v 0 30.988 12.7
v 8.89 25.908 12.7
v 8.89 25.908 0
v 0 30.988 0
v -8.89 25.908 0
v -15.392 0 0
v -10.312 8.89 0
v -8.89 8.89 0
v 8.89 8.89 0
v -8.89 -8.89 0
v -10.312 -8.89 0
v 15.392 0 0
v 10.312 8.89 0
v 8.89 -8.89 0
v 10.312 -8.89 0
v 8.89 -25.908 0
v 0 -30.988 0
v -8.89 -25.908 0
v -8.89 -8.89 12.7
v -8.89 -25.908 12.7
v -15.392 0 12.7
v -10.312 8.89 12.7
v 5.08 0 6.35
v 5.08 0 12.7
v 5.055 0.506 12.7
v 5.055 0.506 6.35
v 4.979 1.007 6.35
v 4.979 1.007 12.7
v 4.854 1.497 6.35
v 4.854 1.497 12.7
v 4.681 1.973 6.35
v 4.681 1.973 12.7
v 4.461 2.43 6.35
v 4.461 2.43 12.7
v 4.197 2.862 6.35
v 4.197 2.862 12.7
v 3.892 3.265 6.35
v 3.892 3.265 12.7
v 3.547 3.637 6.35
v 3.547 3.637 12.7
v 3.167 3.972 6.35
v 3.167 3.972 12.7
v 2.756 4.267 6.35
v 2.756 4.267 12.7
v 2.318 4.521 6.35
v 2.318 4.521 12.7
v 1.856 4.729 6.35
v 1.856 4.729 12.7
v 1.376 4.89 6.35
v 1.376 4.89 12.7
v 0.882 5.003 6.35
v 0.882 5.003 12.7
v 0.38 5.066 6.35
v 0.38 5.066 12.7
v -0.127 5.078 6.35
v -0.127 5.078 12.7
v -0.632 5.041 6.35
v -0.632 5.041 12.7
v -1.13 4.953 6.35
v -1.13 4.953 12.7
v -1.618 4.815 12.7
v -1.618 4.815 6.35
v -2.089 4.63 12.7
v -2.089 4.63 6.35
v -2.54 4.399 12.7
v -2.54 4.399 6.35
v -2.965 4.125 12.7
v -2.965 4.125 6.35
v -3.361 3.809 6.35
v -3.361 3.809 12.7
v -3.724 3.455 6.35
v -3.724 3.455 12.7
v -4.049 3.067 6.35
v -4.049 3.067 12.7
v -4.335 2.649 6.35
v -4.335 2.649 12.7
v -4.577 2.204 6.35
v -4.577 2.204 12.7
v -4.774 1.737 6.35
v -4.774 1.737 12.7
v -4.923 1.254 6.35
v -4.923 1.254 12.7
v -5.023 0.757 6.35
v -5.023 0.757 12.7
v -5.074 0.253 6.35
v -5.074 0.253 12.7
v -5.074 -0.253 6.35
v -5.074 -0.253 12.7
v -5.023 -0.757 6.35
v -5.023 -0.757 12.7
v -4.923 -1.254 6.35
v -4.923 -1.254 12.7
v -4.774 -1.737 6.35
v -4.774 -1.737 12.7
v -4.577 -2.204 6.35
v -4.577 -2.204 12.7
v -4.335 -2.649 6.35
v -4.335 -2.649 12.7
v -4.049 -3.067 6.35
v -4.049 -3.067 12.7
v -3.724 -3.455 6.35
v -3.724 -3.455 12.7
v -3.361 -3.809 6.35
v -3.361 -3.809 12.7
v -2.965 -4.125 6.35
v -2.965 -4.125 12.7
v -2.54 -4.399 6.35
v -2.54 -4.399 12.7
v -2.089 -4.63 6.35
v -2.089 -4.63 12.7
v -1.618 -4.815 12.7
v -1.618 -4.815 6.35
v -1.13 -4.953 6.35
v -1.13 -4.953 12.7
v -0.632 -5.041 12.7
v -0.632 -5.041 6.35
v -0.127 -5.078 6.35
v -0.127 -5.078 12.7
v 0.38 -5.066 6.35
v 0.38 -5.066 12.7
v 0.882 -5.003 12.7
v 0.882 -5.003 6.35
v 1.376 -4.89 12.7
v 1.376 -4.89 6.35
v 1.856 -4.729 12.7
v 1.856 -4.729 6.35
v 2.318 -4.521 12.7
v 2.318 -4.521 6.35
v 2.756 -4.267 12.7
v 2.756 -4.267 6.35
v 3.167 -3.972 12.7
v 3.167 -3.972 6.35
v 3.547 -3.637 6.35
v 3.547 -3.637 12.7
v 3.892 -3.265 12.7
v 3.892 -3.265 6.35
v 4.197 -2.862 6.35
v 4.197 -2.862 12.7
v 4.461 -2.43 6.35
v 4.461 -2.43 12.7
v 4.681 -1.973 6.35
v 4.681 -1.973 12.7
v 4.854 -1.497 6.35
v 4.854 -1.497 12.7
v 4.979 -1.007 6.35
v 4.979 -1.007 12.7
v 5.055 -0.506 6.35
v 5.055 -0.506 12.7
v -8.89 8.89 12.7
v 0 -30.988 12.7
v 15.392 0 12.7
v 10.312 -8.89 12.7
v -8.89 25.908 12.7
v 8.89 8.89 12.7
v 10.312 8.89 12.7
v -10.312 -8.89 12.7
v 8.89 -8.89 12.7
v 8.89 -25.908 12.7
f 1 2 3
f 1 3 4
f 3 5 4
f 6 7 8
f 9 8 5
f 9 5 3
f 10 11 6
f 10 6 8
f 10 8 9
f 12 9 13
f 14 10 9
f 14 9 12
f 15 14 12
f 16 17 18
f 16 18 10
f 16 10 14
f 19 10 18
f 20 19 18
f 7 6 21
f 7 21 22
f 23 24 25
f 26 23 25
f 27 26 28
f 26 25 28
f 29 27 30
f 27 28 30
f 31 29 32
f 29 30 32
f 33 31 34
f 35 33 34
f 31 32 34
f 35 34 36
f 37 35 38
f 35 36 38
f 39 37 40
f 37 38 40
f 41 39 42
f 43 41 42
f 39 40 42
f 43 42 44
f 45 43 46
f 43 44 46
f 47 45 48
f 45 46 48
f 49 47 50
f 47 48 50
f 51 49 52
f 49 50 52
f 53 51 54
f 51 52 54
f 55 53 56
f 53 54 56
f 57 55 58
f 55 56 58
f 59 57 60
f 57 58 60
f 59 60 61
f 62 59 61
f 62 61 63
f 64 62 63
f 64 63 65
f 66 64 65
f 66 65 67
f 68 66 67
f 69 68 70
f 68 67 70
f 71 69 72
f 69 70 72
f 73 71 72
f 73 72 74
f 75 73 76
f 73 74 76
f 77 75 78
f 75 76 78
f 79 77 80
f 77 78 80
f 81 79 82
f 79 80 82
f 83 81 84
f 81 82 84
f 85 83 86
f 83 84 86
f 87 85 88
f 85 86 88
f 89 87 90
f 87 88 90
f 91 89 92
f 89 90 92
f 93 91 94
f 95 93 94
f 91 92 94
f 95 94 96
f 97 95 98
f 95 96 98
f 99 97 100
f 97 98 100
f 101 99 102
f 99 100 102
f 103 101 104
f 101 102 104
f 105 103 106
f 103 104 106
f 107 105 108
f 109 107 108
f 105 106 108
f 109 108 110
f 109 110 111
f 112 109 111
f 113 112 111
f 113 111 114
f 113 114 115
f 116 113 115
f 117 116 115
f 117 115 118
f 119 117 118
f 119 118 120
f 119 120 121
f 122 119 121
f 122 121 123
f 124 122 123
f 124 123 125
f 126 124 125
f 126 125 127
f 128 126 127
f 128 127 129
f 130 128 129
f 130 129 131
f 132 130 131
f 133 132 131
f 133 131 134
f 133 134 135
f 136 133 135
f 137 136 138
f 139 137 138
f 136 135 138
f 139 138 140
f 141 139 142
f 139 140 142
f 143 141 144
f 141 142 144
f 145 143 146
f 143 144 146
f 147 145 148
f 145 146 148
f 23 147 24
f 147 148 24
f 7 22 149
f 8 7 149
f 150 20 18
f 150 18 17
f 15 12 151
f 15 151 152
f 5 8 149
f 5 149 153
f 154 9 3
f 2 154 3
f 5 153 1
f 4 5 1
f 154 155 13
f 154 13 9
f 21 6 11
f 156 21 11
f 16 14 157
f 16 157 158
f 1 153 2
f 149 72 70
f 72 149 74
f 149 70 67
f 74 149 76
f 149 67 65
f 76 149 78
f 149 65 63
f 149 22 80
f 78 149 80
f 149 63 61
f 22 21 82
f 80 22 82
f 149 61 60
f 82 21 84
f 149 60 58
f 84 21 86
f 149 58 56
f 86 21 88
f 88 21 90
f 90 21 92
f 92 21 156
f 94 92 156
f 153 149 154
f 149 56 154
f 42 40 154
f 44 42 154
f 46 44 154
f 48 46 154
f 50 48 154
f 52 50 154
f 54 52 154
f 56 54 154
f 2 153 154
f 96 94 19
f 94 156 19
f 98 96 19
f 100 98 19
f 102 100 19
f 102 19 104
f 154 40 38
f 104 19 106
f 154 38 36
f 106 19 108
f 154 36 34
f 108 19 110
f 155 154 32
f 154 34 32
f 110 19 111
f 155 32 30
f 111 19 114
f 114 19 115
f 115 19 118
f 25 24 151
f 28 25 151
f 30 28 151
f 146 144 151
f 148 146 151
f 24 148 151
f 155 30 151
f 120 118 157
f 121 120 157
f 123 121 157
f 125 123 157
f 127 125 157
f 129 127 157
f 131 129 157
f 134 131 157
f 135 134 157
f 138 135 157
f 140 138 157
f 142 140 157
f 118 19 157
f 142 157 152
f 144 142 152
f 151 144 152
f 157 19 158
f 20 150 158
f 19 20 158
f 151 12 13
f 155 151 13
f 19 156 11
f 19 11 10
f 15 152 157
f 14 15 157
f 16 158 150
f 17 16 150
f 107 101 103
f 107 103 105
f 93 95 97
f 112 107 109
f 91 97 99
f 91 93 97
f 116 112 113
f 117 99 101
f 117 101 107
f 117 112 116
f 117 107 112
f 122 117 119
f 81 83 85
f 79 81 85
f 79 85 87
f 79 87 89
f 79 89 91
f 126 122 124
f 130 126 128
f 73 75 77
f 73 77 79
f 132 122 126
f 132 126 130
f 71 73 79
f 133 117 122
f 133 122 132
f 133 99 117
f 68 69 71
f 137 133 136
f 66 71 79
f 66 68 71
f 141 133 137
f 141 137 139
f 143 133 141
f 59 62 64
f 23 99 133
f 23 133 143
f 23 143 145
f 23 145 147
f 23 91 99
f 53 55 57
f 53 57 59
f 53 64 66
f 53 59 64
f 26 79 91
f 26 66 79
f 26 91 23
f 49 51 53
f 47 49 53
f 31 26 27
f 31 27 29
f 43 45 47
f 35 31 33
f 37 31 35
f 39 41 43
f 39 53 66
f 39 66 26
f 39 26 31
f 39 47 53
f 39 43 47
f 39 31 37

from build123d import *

# Parameters (mm, degrees)
BOSS_EXTRUDE1_DEPTH  = 12.7
MIRROR2_COPY_1_DEPTH = 12.7
SKETCH2_R            = 5.08
CUT_EXTRUDE1_DEPTH   = 6.35


with BuildPart() as part:
    # Sketch1 → Boss-Extrude1 (new body)
    with BuildSketch(Plane.XY):
        Polygon((0, 0), (-15.3924, 0), (-10.3124, 8.89), (-8.89, 8.89), (-8.89, 25.908), (0, 30.988), align=None)
    boss_extrude1 = extrude(amount=BOSS_EXTRUDE1_DEPTH)

    # Mirror1: Boss-Extrude1 across plane
    add(boss_extrude1.mirror(Plane(origin=(0, 30.988, 12.7), x_dir=(0, 0, 1), z_dir=(-1, 0, 0))))

    # Mirror2: Boss-Extrude1 across plane
    add(boss_extrude1.mirror(Plane(origin=(0, 0, 12.7), x_dir=(0, 0, 1), z_dir=(0, 1, 0))))

    # Mirror2 copy 1 sketch → Mirror2 copy 1 (add)
    with BuildSketch(Plane(origin=(0, 0, 0), x_dir=(-1, 0, 0), z_dir=(0, 0, 1))):
        Polygon((0, 0), (-15.3924, 0), (-10.3124, 8.89), (-8.89, 8.89), (-8.89, 25.908), (0, 30.988), align=None)
    extrude(amount=MIRROR2_COPY_1_DEPTH)

    # Sketch2 → Cut-Extrude1 (cut)
    with BuildSketch(Plane.XY.offset(12.7)):
        Circle(SKETCH2_R)
    extrude(amount=-CUT_EXTRUDE1_DEPTH, mode=Mode.SUBTRACT)


solid = part.part
